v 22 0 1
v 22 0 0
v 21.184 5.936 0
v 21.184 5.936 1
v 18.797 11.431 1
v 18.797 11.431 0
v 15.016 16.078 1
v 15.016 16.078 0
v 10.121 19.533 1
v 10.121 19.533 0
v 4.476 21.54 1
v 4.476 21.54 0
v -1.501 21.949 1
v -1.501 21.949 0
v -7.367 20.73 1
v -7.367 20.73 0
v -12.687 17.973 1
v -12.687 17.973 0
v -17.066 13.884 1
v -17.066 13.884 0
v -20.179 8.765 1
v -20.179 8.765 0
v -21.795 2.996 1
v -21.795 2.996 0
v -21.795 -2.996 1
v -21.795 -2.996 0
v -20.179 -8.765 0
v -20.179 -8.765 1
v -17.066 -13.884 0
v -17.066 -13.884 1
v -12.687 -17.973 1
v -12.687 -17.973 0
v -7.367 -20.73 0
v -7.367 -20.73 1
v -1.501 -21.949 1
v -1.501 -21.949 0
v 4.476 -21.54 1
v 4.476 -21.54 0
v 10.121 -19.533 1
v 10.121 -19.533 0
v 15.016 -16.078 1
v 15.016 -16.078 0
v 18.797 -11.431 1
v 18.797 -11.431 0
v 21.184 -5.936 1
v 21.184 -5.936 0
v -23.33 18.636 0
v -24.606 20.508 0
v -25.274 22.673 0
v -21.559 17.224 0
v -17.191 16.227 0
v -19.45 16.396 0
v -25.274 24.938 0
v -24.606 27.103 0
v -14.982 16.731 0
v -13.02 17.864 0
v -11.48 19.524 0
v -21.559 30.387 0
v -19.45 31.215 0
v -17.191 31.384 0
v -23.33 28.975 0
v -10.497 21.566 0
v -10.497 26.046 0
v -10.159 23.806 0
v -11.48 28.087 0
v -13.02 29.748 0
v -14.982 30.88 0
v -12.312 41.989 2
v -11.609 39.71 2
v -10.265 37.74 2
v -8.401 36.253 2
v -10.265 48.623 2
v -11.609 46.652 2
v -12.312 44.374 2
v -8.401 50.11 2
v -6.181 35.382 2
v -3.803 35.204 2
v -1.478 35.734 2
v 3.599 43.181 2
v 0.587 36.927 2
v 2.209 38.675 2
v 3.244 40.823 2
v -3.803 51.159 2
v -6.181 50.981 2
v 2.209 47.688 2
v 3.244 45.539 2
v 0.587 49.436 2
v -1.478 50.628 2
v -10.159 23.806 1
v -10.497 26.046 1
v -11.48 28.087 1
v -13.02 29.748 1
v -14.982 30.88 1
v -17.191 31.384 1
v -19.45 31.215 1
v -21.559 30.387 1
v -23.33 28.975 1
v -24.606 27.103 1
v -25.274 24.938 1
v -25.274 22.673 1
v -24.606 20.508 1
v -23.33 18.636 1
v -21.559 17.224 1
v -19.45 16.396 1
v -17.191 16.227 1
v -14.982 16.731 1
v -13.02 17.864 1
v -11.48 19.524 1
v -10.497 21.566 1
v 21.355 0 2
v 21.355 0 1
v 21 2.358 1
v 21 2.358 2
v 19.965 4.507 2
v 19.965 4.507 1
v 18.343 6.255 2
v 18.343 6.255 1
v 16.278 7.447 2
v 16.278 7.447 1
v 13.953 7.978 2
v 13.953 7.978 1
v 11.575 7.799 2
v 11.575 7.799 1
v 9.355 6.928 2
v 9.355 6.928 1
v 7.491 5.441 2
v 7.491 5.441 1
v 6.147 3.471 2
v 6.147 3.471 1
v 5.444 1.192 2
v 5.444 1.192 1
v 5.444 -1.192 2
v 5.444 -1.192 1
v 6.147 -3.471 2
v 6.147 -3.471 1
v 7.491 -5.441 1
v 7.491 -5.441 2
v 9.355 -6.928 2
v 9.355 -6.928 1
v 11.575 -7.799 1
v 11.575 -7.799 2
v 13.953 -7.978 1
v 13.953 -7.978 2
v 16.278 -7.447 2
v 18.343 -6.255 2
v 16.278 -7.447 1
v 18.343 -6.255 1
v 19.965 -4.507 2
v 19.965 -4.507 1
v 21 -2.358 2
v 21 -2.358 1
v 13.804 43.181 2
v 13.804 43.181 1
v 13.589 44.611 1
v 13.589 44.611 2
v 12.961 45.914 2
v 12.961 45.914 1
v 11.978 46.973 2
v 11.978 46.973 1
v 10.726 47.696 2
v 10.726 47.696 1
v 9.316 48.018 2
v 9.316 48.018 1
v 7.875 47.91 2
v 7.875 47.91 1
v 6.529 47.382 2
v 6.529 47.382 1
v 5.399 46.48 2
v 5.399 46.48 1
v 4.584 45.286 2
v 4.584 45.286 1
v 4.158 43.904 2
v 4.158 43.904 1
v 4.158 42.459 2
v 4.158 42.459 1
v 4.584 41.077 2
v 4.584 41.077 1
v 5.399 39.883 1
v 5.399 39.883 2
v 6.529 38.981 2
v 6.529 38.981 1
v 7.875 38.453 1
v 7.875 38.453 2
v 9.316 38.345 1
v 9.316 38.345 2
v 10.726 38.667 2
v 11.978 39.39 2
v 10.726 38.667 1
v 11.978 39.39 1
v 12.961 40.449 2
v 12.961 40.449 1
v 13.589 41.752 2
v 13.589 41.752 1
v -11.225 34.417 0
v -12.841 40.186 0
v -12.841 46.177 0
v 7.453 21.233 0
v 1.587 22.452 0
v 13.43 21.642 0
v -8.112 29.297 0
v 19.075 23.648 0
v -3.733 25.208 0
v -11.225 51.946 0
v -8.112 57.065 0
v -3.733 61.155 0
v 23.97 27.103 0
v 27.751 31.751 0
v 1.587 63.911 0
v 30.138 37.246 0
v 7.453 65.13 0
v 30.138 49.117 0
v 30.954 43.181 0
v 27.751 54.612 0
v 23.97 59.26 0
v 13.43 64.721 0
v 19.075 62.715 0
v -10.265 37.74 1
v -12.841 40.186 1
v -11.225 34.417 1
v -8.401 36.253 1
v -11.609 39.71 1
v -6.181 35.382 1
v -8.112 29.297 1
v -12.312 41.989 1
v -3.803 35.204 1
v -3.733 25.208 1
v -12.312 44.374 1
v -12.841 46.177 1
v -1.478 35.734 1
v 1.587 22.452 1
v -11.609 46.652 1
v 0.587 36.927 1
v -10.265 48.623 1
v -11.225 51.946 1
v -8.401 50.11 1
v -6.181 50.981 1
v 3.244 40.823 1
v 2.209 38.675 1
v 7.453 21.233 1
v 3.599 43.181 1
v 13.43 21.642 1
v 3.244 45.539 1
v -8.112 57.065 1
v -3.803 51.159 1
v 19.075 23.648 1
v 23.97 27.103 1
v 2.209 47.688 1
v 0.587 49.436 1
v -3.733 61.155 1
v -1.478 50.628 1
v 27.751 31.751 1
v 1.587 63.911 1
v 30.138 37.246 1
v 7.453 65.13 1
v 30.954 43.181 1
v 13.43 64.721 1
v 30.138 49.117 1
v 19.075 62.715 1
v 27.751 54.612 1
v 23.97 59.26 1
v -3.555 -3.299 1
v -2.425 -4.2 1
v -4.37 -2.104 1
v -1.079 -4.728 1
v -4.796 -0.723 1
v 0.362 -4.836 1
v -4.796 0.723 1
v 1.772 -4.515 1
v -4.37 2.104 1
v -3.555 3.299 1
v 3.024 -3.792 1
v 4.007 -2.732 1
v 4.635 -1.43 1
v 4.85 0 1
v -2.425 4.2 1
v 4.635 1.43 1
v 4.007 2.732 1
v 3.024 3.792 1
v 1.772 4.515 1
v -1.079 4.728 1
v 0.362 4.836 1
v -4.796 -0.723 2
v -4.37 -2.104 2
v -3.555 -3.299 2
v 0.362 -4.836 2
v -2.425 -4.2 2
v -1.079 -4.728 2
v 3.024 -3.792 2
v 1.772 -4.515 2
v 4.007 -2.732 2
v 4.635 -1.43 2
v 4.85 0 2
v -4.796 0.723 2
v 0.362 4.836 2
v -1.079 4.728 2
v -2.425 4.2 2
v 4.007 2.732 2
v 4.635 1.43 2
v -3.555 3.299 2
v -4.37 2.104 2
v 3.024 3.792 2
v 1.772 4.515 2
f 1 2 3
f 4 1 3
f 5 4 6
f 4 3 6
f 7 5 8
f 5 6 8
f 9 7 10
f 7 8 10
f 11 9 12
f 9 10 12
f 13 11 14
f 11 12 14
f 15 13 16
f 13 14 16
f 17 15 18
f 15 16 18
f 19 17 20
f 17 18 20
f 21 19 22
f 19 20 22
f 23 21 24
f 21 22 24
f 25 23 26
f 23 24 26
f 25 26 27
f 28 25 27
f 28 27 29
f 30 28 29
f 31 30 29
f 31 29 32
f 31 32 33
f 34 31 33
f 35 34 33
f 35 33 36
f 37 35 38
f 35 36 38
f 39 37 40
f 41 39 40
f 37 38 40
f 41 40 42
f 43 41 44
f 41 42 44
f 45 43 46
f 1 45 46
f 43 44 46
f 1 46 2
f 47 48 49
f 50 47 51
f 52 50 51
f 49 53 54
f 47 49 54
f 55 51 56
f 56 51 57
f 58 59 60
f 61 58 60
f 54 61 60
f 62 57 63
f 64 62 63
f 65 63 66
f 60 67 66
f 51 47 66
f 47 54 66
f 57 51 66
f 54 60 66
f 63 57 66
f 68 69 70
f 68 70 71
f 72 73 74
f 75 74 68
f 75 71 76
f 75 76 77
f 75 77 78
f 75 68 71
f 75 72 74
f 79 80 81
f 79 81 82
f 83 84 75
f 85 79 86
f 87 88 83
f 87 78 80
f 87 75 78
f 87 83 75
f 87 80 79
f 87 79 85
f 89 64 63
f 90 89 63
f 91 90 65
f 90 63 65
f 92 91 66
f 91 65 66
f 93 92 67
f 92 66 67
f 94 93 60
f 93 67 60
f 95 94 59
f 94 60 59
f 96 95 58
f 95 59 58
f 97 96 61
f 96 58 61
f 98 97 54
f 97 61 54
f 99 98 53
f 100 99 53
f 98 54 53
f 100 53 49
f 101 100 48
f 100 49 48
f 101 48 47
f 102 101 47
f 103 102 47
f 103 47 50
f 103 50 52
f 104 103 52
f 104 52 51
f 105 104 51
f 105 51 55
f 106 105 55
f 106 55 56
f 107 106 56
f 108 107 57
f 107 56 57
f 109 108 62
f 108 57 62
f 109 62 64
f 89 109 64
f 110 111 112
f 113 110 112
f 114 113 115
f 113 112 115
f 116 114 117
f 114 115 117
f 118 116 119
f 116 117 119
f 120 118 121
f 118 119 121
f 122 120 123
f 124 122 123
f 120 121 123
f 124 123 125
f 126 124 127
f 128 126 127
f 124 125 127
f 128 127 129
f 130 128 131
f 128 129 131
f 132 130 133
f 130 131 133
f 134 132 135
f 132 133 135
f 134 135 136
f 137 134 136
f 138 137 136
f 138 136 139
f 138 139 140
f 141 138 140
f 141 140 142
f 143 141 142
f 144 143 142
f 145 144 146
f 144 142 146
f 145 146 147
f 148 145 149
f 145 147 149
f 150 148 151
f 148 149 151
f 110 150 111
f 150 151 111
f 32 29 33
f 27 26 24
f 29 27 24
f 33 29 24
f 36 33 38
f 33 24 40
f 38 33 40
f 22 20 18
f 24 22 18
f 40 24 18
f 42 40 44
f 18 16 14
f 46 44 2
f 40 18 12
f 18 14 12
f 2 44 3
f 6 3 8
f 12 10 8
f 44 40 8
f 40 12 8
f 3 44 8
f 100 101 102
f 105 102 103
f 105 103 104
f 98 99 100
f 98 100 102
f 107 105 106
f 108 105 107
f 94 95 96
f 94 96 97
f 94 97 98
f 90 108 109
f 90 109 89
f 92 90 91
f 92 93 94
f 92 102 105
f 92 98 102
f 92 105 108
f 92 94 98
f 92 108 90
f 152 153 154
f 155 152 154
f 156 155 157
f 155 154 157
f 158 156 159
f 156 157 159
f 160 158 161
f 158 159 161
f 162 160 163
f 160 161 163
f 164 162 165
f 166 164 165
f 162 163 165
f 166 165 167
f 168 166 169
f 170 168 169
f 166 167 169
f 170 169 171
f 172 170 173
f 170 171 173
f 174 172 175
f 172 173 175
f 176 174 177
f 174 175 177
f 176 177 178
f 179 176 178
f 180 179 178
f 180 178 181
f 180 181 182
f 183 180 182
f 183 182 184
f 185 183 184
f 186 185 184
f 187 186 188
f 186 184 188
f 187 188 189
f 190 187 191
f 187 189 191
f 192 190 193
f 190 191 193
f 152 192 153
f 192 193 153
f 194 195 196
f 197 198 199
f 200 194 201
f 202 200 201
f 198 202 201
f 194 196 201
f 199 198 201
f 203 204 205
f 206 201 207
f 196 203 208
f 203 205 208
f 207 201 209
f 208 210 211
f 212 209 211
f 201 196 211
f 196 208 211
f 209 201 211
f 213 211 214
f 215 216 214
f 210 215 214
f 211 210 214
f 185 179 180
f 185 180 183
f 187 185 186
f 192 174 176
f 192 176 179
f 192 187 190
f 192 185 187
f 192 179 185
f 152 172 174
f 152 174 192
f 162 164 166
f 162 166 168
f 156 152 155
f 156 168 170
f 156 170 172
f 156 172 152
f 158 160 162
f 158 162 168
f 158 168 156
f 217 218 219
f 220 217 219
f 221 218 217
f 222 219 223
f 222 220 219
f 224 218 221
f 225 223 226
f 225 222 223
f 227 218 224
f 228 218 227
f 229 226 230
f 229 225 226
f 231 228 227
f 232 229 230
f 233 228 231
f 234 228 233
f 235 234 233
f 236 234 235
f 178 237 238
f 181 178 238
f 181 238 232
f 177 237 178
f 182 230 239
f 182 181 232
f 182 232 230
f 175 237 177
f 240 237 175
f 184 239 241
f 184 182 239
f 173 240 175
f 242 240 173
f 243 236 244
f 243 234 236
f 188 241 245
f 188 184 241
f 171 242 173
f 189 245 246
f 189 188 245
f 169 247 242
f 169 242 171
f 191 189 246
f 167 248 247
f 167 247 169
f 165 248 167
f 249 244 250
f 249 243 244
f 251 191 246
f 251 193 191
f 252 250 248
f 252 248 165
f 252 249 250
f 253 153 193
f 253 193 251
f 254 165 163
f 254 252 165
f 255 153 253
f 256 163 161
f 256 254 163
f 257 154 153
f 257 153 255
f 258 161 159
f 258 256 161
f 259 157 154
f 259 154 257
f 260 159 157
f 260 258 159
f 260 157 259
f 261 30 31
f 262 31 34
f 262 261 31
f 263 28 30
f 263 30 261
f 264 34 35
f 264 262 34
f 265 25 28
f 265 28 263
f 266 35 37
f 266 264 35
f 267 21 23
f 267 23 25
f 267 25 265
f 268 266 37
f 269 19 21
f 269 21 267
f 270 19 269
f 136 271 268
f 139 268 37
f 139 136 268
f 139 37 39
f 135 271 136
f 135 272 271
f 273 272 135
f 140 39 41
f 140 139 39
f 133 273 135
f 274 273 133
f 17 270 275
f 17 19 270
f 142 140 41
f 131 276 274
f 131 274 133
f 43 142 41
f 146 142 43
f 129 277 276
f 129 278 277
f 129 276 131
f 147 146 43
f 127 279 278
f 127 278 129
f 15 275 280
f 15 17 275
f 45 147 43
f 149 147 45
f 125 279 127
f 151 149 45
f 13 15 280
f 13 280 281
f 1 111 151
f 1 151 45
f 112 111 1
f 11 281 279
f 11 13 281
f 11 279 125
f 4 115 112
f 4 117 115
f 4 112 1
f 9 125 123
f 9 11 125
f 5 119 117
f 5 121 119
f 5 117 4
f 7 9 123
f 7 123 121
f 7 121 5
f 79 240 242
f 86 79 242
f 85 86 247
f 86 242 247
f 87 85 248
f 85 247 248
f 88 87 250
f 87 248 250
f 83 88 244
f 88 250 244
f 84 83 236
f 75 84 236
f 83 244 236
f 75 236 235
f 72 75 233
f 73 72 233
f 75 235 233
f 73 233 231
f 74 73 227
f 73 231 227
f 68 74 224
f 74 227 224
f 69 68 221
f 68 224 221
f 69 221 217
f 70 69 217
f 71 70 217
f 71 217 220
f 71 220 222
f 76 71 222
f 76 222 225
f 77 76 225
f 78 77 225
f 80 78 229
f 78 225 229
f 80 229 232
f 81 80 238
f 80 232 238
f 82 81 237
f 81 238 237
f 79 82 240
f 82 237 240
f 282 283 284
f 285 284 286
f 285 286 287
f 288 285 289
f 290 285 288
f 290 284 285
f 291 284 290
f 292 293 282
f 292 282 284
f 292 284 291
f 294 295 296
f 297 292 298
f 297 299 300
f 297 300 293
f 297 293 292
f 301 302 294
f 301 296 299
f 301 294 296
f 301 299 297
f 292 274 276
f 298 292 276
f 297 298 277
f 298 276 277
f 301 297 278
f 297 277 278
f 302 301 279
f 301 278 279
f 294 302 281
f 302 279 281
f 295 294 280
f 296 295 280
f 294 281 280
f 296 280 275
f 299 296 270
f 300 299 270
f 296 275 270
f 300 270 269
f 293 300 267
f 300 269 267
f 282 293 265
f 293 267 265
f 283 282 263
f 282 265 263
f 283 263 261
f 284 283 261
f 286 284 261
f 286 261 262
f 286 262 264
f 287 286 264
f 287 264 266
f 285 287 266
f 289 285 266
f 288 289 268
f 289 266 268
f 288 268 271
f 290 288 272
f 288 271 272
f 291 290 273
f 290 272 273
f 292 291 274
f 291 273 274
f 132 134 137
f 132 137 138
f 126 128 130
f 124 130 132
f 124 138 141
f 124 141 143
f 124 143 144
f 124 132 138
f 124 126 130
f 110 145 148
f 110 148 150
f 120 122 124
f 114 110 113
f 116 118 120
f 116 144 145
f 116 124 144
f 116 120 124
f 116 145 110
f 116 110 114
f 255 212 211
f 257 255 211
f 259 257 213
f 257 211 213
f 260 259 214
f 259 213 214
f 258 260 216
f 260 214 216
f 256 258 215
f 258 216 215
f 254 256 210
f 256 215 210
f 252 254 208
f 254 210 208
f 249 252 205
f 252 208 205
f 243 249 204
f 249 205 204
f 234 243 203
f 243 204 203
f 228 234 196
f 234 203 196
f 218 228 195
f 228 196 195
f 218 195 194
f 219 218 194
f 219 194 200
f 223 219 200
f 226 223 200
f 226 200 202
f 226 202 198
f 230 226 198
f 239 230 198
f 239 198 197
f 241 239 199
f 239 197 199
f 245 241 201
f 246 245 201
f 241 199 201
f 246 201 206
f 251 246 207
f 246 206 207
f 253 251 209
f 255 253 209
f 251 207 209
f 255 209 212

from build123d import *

# Parameters (mm, degrees)
ESBO_O2_R                  = 22
RESSALTO_EXTRUS_O1_DEPTH   = 1
RESSALTO_EXTRUS_O1_2_DEPTH = 1
ESBO_O2_R_2                = 7.6
RESSALTO_EXTRUS_O1_3_DEPTH = 1
ESBO_O3_R                  = 4.85
ESBO_O3_R_2                = 8
RESSALTO_EXTRUS_O2_DEPTH   = 1


with BuildPart() as part:
    # Esboço2 → Ressalto-extrusão1 (new body)
    with BuildSketch(Plane.XY):
        Circle(ESBO_O2_R)
    extrude(amount=RESSALTO_EXTRUS_O1_DEPTH)



with BuildPart() as body_2:
    # Esboço2 → Ressalto-extrus_o1 2 (new body)
    with BuildSketch(Plane.XY):
        with Locations((8.954, 43.181429851)):
            Circle(ESBO_O2_R)
    extrude(amount=RESSALTO_EXTRUS_O1_2_DEPTH)


with BuildPart() as body_3:
    # Esboço2 → Ressalto-extrus_o1 3 (new body)
    with BuildSketch(Plane.XY):
        with Locations((-17.758926266, 23.80568289)):
            Circle(ESBO_O2_R_2)
    extrude(amount=RESSALTO_EXTRUS_O1_3_DEPTH)


with BuildPart() as part_1:
    add(part.part)

    add(body_2.part)  # Ressalto-extrusão2 merges body 2
    # Esboço3 → Ressalto-extrusão2 (add)
    with BuildSketch(Plane.XY.offset(1)):
        with Locations((8.954, 43.181429851)):
            Circle(ESBO_O3_R)
        Circle(ESBO_O3_R)
        with Locations((-4.401, 43.181429851)):
            Circle(ESBO_O3_R_2)
        with Locations((13.355, 0)):
            Circle(ESBO_O3_R_2)
    extrude(amount=RESSALTO_EXTRUS_O2_DEPTH)


solid = Compound([body_3.part, part_1.part])
